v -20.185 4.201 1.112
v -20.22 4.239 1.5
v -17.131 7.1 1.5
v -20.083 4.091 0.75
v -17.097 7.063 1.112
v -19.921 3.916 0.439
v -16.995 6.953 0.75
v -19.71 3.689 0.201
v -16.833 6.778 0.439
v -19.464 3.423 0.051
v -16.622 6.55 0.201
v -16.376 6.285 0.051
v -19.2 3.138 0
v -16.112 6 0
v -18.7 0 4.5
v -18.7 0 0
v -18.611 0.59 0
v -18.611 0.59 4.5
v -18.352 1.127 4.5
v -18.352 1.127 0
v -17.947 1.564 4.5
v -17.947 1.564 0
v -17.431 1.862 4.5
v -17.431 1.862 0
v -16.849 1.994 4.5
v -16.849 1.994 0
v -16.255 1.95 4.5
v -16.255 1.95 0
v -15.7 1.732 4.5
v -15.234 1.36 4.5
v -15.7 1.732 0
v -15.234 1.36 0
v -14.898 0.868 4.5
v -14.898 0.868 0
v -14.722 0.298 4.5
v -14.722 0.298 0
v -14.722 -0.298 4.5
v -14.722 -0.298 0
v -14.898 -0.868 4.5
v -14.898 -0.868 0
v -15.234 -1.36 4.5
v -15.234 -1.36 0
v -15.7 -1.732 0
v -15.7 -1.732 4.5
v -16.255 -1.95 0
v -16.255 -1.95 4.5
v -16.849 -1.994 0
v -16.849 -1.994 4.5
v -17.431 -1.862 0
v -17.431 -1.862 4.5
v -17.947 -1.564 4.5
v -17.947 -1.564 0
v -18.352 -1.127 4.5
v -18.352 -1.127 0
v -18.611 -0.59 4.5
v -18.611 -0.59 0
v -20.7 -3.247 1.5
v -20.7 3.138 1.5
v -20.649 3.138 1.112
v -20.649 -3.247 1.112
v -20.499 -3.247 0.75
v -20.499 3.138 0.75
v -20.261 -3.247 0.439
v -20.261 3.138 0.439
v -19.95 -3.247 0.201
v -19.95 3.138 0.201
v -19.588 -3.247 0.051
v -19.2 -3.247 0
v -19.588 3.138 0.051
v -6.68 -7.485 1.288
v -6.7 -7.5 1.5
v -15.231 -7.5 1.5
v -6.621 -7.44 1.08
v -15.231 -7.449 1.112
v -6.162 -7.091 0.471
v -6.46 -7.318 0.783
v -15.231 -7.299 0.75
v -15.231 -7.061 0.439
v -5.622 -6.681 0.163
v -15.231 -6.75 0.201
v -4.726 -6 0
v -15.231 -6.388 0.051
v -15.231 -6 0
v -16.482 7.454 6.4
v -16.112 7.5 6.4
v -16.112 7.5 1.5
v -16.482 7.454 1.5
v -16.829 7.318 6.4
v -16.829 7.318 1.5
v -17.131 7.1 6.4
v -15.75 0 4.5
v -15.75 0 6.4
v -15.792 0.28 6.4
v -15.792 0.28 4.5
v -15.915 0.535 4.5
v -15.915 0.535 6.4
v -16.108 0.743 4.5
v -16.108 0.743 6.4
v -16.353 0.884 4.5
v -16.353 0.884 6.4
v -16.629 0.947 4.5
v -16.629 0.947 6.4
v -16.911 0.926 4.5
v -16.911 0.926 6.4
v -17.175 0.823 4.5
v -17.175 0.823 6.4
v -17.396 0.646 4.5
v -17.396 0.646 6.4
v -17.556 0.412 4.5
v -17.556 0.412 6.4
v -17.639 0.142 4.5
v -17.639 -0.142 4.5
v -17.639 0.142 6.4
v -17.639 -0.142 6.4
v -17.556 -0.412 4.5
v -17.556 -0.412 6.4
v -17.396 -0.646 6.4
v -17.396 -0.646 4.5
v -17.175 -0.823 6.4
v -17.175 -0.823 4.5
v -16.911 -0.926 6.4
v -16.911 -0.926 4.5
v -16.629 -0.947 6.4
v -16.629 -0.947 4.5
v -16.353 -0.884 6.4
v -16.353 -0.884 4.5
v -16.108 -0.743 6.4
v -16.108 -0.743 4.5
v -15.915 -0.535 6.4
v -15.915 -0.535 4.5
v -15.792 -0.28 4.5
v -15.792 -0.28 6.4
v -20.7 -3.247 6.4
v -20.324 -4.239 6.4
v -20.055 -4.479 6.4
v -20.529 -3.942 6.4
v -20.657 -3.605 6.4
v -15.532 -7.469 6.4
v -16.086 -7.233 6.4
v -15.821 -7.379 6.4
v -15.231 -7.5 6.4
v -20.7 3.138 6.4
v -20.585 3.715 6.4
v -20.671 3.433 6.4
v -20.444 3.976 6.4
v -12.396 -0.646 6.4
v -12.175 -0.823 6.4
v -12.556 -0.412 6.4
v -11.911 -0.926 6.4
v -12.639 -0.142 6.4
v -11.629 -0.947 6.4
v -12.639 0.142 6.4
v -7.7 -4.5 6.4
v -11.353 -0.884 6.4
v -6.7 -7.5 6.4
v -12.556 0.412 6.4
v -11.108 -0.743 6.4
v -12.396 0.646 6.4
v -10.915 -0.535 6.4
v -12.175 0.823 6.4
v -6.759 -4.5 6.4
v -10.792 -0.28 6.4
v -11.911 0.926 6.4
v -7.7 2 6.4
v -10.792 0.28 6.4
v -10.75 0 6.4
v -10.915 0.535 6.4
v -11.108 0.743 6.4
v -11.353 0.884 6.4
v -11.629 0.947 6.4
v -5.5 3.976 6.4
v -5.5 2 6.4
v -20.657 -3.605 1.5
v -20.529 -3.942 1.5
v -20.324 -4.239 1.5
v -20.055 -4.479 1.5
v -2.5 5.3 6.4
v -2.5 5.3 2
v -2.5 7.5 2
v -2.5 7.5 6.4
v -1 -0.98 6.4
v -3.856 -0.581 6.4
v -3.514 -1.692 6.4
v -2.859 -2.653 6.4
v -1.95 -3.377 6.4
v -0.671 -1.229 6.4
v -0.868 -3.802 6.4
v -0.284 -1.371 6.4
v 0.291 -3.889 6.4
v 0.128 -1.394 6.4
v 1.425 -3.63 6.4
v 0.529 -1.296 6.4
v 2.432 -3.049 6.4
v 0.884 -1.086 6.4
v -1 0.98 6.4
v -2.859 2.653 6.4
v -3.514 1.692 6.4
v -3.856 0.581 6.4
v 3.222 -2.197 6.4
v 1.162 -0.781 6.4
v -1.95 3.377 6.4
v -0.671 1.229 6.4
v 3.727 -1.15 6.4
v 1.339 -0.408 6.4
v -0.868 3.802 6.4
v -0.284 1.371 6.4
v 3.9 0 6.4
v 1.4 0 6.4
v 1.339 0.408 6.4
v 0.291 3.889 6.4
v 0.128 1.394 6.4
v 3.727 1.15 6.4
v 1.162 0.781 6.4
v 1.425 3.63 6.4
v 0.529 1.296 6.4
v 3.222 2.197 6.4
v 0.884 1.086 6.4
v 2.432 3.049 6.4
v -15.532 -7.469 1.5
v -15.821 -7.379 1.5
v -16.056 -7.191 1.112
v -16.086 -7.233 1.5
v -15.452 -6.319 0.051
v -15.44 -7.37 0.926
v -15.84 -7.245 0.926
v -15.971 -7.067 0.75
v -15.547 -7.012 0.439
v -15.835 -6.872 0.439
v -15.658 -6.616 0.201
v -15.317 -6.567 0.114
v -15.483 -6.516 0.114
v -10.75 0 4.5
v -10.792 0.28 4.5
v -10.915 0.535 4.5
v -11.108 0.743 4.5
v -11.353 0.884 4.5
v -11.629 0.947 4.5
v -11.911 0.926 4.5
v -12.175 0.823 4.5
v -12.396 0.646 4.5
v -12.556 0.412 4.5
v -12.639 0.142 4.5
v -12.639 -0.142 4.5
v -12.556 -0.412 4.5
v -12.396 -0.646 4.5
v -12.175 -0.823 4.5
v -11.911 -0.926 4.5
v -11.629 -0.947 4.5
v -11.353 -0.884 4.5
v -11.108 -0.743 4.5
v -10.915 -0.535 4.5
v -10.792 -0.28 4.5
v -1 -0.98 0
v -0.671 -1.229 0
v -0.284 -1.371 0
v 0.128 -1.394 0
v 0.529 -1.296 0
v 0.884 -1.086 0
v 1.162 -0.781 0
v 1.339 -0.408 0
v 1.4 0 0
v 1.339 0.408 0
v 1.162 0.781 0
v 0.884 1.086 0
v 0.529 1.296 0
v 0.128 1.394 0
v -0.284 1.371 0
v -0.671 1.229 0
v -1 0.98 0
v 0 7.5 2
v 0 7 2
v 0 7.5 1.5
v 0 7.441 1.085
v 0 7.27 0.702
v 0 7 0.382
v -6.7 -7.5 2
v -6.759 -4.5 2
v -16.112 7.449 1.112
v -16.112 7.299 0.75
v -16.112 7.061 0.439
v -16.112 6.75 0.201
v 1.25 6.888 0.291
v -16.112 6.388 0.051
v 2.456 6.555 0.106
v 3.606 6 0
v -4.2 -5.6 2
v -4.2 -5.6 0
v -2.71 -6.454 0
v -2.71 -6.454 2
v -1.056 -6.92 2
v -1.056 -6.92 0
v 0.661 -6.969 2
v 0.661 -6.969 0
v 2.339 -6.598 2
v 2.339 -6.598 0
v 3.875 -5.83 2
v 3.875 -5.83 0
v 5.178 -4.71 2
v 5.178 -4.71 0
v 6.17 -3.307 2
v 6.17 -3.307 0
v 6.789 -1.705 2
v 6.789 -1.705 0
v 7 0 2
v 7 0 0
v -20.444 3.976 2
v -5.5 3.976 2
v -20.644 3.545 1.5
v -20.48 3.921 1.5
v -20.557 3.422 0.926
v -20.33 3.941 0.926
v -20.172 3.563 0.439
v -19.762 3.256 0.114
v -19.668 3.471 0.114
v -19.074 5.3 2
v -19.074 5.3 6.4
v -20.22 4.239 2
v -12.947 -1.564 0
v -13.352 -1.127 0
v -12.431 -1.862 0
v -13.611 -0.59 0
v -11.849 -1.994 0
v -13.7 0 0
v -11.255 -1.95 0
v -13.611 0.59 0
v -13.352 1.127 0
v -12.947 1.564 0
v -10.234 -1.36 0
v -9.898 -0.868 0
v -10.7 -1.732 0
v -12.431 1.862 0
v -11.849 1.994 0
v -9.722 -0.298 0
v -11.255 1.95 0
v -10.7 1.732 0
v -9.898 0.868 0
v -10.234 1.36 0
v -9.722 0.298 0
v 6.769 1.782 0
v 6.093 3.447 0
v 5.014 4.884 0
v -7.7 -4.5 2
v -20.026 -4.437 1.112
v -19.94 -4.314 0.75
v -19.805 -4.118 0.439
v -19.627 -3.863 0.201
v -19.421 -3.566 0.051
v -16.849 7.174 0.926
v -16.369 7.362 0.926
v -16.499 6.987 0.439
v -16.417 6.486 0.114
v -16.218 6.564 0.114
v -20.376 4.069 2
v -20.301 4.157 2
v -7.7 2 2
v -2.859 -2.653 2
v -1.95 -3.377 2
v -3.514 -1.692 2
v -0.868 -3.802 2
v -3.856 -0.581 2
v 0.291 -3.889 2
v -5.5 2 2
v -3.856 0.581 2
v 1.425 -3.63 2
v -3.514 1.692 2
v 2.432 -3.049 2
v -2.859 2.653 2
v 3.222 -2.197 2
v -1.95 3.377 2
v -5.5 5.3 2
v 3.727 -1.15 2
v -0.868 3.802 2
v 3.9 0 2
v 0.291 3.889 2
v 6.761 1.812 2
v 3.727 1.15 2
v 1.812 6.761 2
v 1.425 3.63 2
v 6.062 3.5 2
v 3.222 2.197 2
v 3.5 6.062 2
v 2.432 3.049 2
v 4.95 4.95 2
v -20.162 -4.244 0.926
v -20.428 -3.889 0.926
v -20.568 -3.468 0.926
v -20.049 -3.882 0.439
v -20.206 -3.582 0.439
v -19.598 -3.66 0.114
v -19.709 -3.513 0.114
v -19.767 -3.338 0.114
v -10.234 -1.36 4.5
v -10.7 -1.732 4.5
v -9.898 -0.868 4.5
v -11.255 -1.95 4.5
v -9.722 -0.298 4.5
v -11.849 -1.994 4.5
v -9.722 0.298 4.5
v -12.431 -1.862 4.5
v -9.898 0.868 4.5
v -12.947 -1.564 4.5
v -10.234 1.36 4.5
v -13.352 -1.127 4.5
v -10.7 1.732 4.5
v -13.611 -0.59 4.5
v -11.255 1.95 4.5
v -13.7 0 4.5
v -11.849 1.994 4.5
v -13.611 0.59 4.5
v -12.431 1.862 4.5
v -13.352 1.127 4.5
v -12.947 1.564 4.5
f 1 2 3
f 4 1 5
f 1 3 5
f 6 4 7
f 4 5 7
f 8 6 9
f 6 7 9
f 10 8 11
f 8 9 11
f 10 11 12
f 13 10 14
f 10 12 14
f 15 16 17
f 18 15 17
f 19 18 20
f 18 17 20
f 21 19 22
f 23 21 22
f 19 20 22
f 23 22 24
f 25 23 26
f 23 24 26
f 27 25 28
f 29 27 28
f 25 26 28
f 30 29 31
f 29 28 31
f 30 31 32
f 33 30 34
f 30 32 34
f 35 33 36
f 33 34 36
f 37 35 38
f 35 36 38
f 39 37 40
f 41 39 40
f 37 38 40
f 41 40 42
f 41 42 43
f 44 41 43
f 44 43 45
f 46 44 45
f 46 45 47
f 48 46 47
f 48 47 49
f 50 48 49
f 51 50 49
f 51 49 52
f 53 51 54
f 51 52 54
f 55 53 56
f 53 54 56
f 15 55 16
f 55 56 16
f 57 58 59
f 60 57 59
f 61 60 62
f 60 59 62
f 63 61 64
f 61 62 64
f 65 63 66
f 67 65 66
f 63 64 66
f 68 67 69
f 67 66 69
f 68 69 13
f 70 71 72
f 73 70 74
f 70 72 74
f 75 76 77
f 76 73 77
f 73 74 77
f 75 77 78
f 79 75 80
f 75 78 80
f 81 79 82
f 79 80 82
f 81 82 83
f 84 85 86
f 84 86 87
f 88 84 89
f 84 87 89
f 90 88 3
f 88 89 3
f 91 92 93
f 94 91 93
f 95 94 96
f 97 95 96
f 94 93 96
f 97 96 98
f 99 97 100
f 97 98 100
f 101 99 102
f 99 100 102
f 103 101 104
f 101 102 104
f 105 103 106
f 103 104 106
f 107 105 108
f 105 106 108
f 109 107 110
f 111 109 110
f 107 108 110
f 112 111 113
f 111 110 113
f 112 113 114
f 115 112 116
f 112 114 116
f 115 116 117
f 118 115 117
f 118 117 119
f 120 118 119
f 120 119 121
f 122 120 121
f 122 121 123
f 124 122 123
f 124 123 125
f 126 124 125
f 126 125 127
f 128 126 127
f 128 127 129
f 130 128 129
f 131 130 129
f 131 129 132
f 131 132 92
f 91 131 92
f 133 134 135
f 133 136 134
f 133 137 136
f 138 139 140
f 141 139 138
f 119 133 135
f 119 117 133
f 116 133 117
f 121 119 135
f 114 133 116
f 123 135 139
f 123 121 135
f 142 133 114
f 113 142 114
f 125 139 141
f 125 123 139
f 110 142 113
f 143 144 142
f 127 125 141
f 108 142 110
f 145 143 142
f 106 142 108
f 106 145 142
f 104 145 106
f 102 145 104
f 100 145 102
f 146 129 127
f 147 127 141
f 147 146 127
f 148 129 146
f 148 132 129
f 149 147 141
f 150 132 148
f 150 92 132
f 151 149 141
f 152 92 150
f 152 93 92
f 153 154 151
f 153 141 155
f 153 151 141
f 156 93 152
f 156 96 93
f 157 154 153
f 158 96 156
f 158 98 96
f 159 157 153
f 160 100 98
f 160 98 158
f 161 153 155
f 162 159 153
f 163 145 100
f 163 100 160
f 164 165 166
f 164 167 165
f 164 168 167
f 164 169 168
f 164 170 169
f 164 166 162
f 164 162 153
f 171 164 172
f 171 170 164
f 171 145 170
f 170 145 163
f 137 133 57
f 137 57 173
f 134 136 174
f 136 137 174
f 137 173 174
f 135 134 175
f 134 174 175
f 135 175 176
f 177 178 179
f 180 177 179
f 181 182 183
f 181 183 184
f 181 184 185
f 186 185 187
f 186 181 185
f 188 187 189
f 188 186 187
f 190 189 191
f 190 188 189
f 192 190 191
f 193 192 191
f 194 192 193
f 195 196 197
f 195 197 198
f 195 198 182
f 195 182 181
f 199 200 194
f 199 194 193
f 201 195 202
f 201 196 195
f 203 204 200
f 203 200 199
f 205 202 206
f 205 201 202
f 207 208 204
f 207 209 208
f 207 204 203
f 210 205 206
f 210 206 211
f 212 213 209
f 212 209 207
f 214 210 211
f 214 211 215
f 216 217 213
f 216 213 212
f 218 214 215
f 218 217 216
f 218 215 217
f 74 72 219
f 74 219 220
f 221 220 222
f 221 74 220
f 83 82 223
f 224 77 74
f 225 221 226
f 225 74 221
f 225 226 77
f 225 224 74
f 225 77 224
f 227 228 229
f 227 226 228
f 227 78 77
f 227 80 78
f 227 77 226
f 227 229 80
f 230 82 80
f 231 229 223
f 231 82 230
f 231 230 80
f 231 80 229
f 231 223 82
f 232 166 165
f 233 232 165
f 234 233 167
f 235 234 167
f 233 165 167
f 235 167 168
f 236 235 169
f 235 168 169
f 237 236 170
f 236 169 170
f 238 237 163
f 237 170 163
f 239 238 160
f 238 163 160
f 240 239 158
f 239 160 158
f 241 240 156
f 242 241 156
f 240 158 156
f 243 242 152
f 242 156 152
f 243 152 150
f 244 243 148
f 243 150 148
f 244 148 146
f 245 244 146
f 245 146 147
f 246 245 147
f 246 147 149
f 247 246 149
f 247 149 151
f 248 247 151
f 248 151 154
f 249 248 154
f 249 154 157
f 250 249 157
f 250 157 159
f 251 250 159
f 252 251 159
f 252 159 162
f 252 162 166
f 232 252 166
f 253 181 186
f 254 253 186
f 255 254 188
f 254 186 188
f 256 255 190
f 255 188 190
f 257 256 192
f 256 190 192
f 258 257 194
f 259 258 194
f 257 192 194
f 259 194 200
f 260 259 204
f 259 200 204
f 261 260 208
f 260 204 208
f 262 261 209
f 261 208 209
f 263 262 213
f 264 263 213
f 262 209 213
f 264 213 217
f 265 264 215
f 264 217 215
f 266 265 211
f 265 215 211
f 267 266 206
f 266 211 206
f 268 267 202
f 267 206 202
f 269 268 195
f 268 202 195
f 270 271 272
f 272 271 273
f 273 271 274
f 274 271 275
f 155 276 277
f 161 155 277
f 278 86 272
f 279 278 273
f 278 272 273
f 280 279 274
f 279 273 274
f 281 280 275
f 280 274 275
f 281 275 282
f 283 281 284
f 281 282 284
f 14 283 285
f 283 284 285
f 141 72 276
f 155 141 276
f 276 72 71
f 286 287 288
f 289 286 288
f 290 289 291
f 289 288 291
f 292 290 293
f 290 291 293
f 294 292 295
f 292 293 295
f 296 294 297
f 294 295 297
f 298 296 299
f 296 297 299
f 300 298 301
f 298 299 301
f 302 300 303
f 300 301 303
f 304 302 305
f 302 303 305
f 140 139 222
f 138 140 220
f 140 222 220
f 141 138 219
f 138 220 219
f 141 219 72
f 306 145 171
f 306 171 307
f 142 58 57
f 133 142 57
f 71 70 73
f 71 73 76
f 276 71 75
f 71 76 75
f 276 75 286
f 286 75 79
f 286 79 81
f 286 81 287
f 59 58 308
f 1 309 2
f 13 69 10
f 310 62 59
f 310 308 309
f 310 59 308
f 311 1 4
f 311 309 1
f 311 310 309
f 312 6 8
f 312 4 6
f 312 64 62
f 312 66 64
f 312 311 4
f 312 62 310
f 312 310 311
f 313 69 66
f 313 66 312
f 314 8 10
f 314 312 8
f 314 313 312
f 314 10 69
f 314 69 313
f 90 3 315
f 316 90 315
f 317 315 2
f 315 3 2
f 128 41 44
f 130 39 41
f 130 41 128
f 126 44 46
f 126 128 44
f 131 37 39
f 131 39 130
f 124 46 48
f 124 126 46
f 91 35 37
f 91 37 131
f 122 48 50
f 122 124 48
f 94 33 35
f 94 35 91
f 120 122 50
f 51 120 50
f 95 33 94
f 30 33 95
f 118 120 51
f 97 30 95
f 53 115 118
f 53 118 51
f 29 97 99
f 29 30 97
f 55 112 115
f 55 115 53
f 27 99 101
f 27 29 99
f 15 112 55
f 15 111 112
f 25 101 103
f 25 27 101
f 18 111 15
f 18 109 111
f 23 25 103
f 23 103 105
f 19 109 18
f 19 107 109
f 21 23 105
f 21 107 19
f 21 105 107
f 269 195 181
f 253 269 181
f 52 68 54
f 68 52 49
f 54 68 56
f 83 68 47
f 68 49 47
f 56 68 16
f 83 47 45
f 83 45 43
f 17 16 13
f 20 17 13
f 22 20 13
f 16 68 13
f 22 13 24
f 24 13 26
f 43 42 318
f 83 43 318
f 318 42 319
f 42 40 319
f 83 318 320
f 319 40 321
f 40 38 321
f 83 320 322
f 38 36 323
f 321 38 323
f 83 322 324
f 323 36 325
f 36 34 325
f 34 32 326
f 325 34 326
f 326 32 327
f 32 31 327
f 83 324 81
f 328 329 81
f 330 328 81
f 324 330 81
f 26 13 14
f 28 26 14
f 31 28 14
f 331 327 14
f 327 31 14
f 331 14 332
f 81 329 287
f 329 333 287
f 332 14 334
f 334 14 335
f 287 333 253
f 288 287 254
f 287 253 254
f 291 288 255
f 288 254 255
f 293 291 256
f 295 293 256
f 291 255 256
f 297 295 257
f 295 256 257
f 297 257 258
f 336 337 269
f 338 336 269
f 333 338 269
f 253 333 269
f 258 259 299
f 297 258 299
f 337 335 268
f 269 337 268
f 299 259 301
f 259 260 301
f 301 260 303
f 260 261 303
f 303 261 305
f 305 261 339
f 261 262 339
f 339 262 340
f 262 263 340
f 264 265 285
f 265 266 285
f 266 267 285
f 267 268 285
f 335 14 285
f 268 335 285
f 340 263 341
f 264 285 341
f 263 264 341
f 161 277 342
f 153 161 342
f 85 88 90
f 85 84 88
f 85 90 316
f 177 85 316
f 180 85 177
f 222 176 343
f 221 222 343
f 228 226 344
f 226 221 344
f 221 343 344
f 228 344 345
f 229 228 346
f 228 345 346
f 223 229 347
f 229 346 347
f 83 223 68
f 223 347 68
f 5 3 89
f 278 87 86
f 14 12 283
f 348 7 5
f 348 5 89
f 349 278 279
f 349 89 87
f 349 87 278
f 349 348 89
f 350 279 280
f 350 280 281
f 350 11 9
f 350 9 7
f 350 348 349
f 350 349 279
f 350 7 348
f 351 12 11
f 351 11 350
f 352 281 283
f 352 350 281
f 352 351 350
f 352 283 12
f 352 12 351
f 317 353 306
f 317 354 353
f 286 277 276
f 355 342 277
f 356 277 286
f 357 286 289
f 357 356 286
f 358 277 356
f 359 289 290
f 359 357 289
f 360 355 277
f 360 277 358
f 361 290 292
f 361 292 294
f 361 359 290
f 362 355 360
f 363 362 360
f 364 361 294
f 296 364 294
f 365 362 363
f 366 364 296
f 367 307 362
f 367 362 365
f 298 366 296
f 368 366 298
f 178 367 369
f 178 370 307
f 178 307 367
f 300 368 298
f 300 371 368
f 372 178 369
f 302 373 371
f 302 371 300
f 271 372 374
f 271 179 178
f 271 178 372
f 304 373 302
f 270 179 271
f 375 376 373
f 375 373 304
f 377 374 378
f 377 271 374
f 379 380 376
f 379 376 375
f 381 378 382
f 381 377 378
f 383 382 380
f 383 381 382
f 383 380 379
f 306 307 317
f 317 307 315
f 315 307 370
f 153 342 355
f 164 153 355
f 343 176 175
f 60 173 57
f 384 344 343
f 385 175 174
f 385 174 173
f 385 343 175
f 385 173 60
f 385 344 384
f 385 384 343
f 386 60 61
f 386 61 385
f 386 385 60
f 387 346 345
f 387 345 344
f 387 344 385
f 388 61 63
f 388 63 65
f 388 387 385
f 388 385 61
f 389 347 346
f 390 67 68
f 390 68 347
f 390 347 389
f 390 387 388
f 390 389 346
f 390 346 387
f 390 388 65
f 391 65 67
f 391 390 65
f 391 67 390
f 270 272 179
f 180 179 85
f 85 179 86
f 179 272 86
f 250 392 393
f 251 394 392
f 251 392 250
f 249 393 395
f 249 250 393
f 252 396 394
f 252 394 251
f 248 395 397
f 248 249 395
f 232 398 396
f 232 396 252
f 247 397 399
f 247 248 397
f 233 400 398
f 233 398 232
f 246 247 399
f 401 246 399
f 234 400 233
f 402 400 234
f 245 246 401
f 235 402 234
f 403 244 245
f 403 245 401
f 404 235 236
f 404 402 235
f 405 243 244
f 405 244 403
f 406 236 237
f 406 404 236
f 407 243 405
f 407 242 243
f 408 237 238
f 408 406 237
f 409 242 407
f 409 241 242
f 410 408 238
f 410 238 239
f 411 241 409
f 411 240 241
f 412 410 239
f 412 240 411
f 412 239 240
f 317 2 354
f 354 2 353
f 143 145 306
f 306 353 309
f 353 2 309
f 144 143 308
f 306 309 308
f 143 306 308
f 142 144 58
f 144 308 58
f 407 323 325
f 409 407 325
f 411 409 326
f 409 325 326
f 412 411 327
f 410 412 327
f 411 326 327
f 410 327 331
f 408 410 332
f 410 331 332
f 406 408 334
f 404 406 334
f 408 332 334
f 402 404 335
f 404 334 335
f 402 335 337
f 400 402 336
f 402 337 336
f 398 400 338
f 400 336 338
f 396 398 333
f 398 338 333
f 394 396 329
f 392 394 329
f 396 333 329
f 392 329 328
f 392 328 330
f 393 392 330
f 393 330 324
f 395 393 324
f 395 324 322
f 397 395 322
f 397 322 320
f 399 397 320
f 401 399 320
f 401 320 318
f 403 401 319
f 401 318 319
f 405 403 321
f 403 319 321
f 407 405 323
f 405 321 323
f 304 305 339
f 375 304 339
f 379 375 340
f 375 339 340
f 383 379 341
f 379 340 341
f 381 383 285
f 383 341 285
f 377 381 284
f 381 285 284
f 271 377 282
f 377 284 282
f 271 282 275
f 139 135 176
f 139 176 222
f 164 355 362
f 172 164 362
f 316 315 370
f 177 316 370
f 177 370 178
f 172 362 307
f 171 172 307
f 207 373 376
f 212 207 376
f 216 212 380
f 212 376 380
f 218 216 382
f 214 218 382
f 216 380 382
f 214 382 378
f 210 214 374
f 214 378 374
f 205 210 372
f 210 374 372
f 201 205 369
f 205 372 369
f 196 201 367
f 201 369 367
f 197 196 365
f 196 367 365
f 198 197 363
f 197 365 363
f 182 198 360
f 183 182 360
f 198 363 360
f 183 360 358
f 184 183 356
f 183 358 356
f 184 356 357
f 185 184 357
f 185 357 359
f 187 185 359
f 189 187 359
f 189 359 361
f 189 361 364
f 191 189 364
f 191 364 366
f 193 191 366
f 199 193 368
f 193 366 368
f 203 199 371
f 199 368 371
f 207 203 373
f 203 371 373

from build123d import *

# Parameters (mm, degrees)
BOSS_EXTRUDE1_DEPTH = 2
BOSS_EXTRUDE2_DEPTH = 8
SKETCH24_R          = 3.9
BOSS_EXTRUDE5_DEPTH = 4.4
SKETCH30_W          = 4.40861202
SKETCH30_H          = 1.324178481
CUT_EXTRUDE12_DEPTH = 16
CUT_EXTRUDE11_DEPTH = 23.928148639
FILLET1_R           = 1.5
SKETCH34_W          = 1.5
SKETCH34_H          = 1.5
CUT_EXTRUDE13_DEPTH = 8
SKETCH36_R          = 0.95
CUT_EXTRUDE15_DEPTH = 8
SKETCH37_R          = 2
CUT_EXTRUDE16_DEPTH = 4.5
SKETCH38_W          = 3
SKETCH38_H          = 1.25
CUT_EXTRUDE17_DEPTH = 3.6


with BuildPart() as part:
    # Sketch2 → Boss-Extrude1 (new body)
    with BuildSketch(Plane.XY):
        with BuildLine():
            Line((-2.5, 7.5), (-16.7, 7.5))
            Line((-16.7, 7.5), (-20.7, 3.793442666))
            Line((-20.7, 3.793442666), (-20.7, -4.031648778))
            Line((-20.7, -4.031648778), (-15.7, -7.5))
            Line((-15.7, -7.5), (-6.7, -7.5))
            Line((-6.7, -7.5), (-4.2, -5.6))
            ThreePointArc((-4.2, -5.6), (3.130495168, -6.260990337), (7, 0))
            ThreePointArc((7, 0), (4.949747468, 4.949747468), (0, 7))
            Line((0, 7), (0, 7.5))
            Line((0, 7.5), (-2.5, 7.5))
        make_face()
    extrude(amount=BOSS_EXTRUDE1_DEPTH)

    # Sketch4 → Boss-Extrude2 (add)
    with BuildSketch(Plane.XY.offset(2)):
        Polygon((-15.7, -7.5), (-6.7, -7.5), (-6.759079174, -4.5), (-7.7, -4.5), (-7.7, 2), (-5.5, 2), (-5.5, 5.3), (-2.5, 5.3), (-2.5, 7.5), (-16.7, 7.5), (-20.7, 3.793442666), (-20.7, -4.031648778), align=None)
    extrude(amount=BOSS_EXTRUDE2_DEPTH)

    # Sketch24 → Boss-Extrude5 (add)
    with BuildSketch(Plane.XY.offset(2)):
        Circle(SKETCH24_R)
    extrude(amount=BOSS_EXTRUDE5_DEPTH)

    # Sketch30 → Cut-Extrude12 (cut)
    with BuildSketch(Plane(origin=(-5.5, 0, 0), x_dir=(0, 0, -1), z_dir=(1, 0, 0))):
        with Locations((-4.20430601, 4.63791076)):
            Rectangle(SKETCH30_W, SKETCH30_H)
    extrude(amount=-CUT_EXTRUDE12_DEPTH, mode=Mode.SUBTRACT)

    # Sketch28 → Cut-Extrude11 (cut, through all)
    with BuildSketch(Plane.XY.offset(6.4)):
        with BuildLine():
            Line((-1, 0.979795897), (-1, -0.979795897))
            ThreePointArc((-1, -0.979795897), (1.4, 0), (-1, 0.979795897))
        make_face()
    extrude(amount=-CUT_EXTRUDE11_DEPTH, mode=Mode.SUBTRACT)

    # Fillet1
    # the kernel refuses this fillet: 1.5 mm, written as the material it takes off along each edge
    with BuildSketch(Plane(origin=(-15.230677435, -6, 1.5), x_dir=(-0.5699665637840448, -0.8216678867816415, 0), z_dir=(0, 0, -1))) as fillet1_piece_1_section:
        Polygon((0, 0), (FILLET1_R * 1.02, 0), (FILLET1_R * 1.02, -FILLET1_R * 0.319139344377), (FILLET1_R * 0.838101244517, -FILLET1_R * 0.58136589506), align=None)
    fillet1_piece_1 = extrude(amount=FILLET1_R * 1.02, mode=Mode.PRIVATE)
    fillet1_piece_1 = fillet1_piece_1 - Plane(origin=(-15.230677435, -6, 1.5), x_dir=(0.29860685961507855, 0.9543762064253388, 0), z_dir=(0, 0, -1)) * Sphere(FILLET1_R, mode=Mode.PRIVATE)
    add(fillet1_piece_1, mode=Mode.SUBTRACT)
    with BuildSketch(Plane(origin=(-16.11186344, 6, 1.5), x_dir=(-0.6796897201843015, 0.7334997506991983, 0), z_dir=(0, 0, -1))) as fillet1_piece_2_section:
        Polygon((0, 0), (FILLET1_R * 1.02, 0), (FILLET1_R * 1.02, FILLET1_R * 0.399932860855), (FILLET1_R * 0.748169745713, FILLET1_R * 0.693283514588), align=None)
    fillet1_piece_2 = extrude(amount=FILLET1_R * 1.02, mode=Mode.PRIVATE)
    fillet1_piece_2 = fillet1_piece_2 - Plane(origin=(-16.11186344, 6, 1.5), x_dir=(0.3650344157067945, -0.9309940254102596, 0), z_dir=(0, 0, -1)) * Sphere(FILLET1_R, mode=Mode.PRIVATE)
    add(fillet1_piece_2, mode=Mode.SUBTRACT)
    with BuildSketch(Plane(origin=(-19.2, 3.138411196, 1.5), x_dir=(-0.6796897201843015, 0.7334997506991983, 0), z_dir=(0, 0, -1))) as fillet1_piece_3_section:
        Polygon((0, 0), (FILLET1_R * 1.02, 0), (FILLET1_R * 1.02, -FILLET1_R * 0.445421399395), (FILLET1_R * 0.693283514588, -FILLET1_R * 0.748169745713), align=None)
    fillet1_piece_3 = extrude(amount=FILLET1_R * 1.02, mode=Mode.PRIVATE)
    fillet1_piece_3 = fillet1_piece_3 - Plane(origin=(-19.2, 3.138411196, 1.5), x_dir=(0.9164304993244992, -0.40019387789901173, 0), z_dir=(0, 0, -1)) * Sphere(FILLET1_R, mode=Mode.PRIVATE)
    add(fillet1_piece_3, mode=Mode.SUBTRACT)
    with BuildSketch(Plane(origin=(-19.2, -3.246599046, 1.5), x_dir=(-0.5699665637840448, -0.8216678867816415, 0), z_dir=(0, 0, -1))) as fillet1_piece_4_section:
        Polygon((0, 0), (FILLET1_R * 1.02, 0), (FILLET1_R * 1.02, FILLET1_R * 0.533833817771), (FILLET1_R * 0.58136589506, FILLET1_R * 0.838101244517), align=None)
    fillet1_piece_4 = extrude(amount=FILLET1_R * 1.02, mode=Mode.PRIVATE)
    fillet1_piece_4 = fillet1_piece_4 - Plane(origin=(-19.2, -3.246599046, 1.5), x_dir=(0.8859928227090906, 0.46369895202380795, 0), z_dir=(0, 0, -1)) * Sphere(FILLET1_R, mode=Mode.PRIVATE)
    add(fillet1_piece_4, mode=Mode.SUBTRACT)
    with BuildSketch(Plane(origin=(-15.230677435, -7.5, 0), x_dir=(0, 1, 0), z_dir=(1, 0, 0))) as fillet1_piece_5_section:
        with BuildLine():
            CenterArc((FILLET1_R, FILLET1_R), FILLET1_R, 180, 90)
            Line((0, FILLET1_R), (0, 0))
            Line((0, 0), (FILLET1_R, 0))
        make_face()
    fillet1_piece_5 = extrude(amount=12.280677435, mode=Mode.PRIVATE)
    fillet1_piece_5 = split(fillet1_piece_5, bisect_by=Plane(origin=(-9.092127217, -9.318016685, 0.3282266), z_dir=(-0.6050832675335577, 0.7961621941231027, 0)), keep=Keep.TOP, mode=Mode.PRIVATE)
    add(fillet1_piece_5, mode=Mode.SUBTRACT)
    with BuildSketch(Plane(origin=(3.75, 7.5, 0), x_dir=(0, 0, 1), z_dir=(-1, 0, 0))) as fillet1_piece_6:
        with BuildLine():
            CenterArc((FILLET1_R, -FILLET1_R), FILLET1_R, 90, 90)
            Line((0, -FILLET1_R), (0, 0))
            Line((0, 0), (FILLET1_R, 0))
        make_face()
    extrude(amount=19.86186344, mode=Mode.SUBTRACT)
    with BuildSketch(Plane(origin=(-17.13139802, 7.100249626, 0), x_dir=(0.6796897201843014, -0.7334997506991981, 0), z_dir=(-0.7334997506991983, -0.6796897201843015, 0))) as fillet1_piece_7:
        with BuildLine():
            CenterArc((FILLET1_R, FILLET1_R), FILLET1_R, 180, 90)
            Line((0, FILLET1_R), (0, 0))
            Line((0, 0), (FILLET1_R, 0))
        make_face()
    extrude(amount=4.21013989, mode=Mode.SUBTRACT)
    with BuildSketch(Plane(origin=(-20.054949846, -4.479100876, 0), x_dir=(0.5699665637840448, 0.8216678867816416, 0), z_dir=(0.8216678867816415, -0.5699665637840448, 0))) as fillet1_piece_8:
        with BuildLine():
            CenterArc((FILLET1_R, FILLET1_R), FILLET1_R, 180, 90)
            Line((0, FILLET1_R), (0, 0))
            Line((0, 0), (FILLET1_R, 0))
        make_face()
    extrude(amount=4.830811364, mode=Mode.SUBTRACT)
    with BuildSketch(Plane(origin=(-20.7, 3.138411196, 0), x_dir=(1, 0, 0), z_dir=(0, -1, 0))) as fillet1_piece_9:
        with BuildLine():
            CenterArc((FILLET1_R, FILLET1_R), FILLET1_R, 180, 90)
            Line((0, FILLET1_R), (0, 0))
            Line((0, 0), (FILLET1_R, 0))
        make_face()
    extrude(amount=6.385010242, mode=Mode.SUBTRACT)
    with BuildSketch(Plane(origin=(-15.7, -7.5, 1.5), x_dir=(1, 0, 0), z_dir=(0, 0, 1))) as fillet1_piece_10:
        with BuildLine():
            CenterArc((FILLET1_R * 0.312881710173, FILLET1_R), FILLET1_R, 235.252105822, 34.747894178)
            Line((-FILLET1_R * 0.257084853611, FILLET1_R * 0.178332113218), (0, 0))
            Line((0, 0), (FILLET1_R * 0.312881710173, 0))
        make_face()
    extrude(amount=9.673306413, mode=Mode.SUBTRACT)
    with BuildSketch(Plane(origin=(-20.7, -4.031648778, 1.5), x_dir=(0, 1, 0), z_dir=(0, 0, 1))) as fillet1_piece_11:
        with BuildLine():
            CenterArc((FILLET1_R * 0.523366488011, -FILLET1_R), FILLET1_R, 90, 55.252105822)
            Line((-FILLET1_R * 0.298301398771, -FILLET1_R * 0.430033436216), (0, 0))
            Line((0, 0), (FILLET1_R * 0.523366488011, 0))
        make_face()
    extrude(amount=10.46262433, mode=Mode.SUBTRACT)
    with BuildSketch(Plane(origin=(-20.7, 3.793442666, 1.5), x_dir=(0.7334997506991984, 0.6796897201843014, 0), z_dir=(0, 0, 1))) as fillet1_piece_12:
        with BuildLine():
            CenterArc((FILLET1_R * 0.436687646465, -FILLET1_R), FILLET1_R, 90, 47.18059856)
            Line((-FILLET1_R * 0.296812104234, -FILLET1_R * 0.320310279816), (0, 0))
            Line((0, 0), (FILLET1_R * 0.436687646465, 0))
        make_face()
    extrude(amount=10.137578674, mode=Mode.SUBTRACT)
    with BuildSketch(Plane(origin=(-16.7, 7.5, 1.5), x_dir=(1, 0, 0), z_dir=(0, 0, 1))) as fillet1_piece_13:
        with BuildLine():
            CenterArc((FILLET1_R * 0.392091040054, -FILLET1_R), FILLET1_R, 90, 42.81940144)
            Line((-FILLET1_R * 0.287598680131, -FILLET1_R * 0.266500249301), (0, 0))
            Line((0, 0), (FILLET1_R * 0.392091040054, 0))
        make_face()
    extrude(amount=9.9703414, mode=Mode.SUBTRACT)

    # Sketch34 → Cut-Extrude13 (cut, along a direction that is not the sketch's normal)
    with BuildSketch(Plane.XZ.offset(-2)):
        with Locations((-6.95, 10)):
            Rectangle(SKETCH34_W, SKETCH34_H)
    extrude(amount=-CUT_EXTRUDE13_DEPTH, dir=(0.6685833876565112, -0.7436371788377336, 0), mode=Mode.SUBTRACT)

    # Sketch36 → Cut-Extrude15 (cut)
    with BuildSketch(Plane.XY.offset(10)):
        with Locations((-11.7, 0)):
            Circle(SKETCH36_R)
        with Locations((-16.7, 0)):
            Circle(SKETCH36_R)
    extrude(amount=-CUT_EXTRUDE15_DEPTH, mode=Mode.SUBTRACT)

    # Sketch37 → Cut-Extrude16 (cut)
    with BuildSketch(Plane(origin=(0, 0, 0), x_dir=(-1, 0, 0), z_dir=(0, 0, -1))):
        with Locations((11.7, 0)):
            Circle(SKETCH37_R)
        with Locations((16.7, 0)):
            Circle(SKETCH37_R)
    extrude(amount=-CUT_EXTRUDE16_DEPTH, mode=Mode.SUBTRACT)

    # Sketch38 → Cut-Extrude17 (cut)
    with BuildSketch(Plane.XY.offset(10)):
        with Locations((-4, 5.925)):
            Rectangle(SKETCH38_W, SKETCH38_H)
    extrude(amount=-CUT_EXTRUDE17_DEPTH, mode=Mode.SUBTRACT)


with BuildPart() as body_2:
    # Split1: the piece on the far side of the plane
    add(part.part)
    split(bisect_by=Plane.XY.offset(6.4), keep=Keep.BOTTOM)


with BuildPart() as part_1:
    add(part.part)

    # Split1
    split(bisect_by=Plane.XY.offset(6.4), keep=Keep.TOP)


solid = body_2.part
